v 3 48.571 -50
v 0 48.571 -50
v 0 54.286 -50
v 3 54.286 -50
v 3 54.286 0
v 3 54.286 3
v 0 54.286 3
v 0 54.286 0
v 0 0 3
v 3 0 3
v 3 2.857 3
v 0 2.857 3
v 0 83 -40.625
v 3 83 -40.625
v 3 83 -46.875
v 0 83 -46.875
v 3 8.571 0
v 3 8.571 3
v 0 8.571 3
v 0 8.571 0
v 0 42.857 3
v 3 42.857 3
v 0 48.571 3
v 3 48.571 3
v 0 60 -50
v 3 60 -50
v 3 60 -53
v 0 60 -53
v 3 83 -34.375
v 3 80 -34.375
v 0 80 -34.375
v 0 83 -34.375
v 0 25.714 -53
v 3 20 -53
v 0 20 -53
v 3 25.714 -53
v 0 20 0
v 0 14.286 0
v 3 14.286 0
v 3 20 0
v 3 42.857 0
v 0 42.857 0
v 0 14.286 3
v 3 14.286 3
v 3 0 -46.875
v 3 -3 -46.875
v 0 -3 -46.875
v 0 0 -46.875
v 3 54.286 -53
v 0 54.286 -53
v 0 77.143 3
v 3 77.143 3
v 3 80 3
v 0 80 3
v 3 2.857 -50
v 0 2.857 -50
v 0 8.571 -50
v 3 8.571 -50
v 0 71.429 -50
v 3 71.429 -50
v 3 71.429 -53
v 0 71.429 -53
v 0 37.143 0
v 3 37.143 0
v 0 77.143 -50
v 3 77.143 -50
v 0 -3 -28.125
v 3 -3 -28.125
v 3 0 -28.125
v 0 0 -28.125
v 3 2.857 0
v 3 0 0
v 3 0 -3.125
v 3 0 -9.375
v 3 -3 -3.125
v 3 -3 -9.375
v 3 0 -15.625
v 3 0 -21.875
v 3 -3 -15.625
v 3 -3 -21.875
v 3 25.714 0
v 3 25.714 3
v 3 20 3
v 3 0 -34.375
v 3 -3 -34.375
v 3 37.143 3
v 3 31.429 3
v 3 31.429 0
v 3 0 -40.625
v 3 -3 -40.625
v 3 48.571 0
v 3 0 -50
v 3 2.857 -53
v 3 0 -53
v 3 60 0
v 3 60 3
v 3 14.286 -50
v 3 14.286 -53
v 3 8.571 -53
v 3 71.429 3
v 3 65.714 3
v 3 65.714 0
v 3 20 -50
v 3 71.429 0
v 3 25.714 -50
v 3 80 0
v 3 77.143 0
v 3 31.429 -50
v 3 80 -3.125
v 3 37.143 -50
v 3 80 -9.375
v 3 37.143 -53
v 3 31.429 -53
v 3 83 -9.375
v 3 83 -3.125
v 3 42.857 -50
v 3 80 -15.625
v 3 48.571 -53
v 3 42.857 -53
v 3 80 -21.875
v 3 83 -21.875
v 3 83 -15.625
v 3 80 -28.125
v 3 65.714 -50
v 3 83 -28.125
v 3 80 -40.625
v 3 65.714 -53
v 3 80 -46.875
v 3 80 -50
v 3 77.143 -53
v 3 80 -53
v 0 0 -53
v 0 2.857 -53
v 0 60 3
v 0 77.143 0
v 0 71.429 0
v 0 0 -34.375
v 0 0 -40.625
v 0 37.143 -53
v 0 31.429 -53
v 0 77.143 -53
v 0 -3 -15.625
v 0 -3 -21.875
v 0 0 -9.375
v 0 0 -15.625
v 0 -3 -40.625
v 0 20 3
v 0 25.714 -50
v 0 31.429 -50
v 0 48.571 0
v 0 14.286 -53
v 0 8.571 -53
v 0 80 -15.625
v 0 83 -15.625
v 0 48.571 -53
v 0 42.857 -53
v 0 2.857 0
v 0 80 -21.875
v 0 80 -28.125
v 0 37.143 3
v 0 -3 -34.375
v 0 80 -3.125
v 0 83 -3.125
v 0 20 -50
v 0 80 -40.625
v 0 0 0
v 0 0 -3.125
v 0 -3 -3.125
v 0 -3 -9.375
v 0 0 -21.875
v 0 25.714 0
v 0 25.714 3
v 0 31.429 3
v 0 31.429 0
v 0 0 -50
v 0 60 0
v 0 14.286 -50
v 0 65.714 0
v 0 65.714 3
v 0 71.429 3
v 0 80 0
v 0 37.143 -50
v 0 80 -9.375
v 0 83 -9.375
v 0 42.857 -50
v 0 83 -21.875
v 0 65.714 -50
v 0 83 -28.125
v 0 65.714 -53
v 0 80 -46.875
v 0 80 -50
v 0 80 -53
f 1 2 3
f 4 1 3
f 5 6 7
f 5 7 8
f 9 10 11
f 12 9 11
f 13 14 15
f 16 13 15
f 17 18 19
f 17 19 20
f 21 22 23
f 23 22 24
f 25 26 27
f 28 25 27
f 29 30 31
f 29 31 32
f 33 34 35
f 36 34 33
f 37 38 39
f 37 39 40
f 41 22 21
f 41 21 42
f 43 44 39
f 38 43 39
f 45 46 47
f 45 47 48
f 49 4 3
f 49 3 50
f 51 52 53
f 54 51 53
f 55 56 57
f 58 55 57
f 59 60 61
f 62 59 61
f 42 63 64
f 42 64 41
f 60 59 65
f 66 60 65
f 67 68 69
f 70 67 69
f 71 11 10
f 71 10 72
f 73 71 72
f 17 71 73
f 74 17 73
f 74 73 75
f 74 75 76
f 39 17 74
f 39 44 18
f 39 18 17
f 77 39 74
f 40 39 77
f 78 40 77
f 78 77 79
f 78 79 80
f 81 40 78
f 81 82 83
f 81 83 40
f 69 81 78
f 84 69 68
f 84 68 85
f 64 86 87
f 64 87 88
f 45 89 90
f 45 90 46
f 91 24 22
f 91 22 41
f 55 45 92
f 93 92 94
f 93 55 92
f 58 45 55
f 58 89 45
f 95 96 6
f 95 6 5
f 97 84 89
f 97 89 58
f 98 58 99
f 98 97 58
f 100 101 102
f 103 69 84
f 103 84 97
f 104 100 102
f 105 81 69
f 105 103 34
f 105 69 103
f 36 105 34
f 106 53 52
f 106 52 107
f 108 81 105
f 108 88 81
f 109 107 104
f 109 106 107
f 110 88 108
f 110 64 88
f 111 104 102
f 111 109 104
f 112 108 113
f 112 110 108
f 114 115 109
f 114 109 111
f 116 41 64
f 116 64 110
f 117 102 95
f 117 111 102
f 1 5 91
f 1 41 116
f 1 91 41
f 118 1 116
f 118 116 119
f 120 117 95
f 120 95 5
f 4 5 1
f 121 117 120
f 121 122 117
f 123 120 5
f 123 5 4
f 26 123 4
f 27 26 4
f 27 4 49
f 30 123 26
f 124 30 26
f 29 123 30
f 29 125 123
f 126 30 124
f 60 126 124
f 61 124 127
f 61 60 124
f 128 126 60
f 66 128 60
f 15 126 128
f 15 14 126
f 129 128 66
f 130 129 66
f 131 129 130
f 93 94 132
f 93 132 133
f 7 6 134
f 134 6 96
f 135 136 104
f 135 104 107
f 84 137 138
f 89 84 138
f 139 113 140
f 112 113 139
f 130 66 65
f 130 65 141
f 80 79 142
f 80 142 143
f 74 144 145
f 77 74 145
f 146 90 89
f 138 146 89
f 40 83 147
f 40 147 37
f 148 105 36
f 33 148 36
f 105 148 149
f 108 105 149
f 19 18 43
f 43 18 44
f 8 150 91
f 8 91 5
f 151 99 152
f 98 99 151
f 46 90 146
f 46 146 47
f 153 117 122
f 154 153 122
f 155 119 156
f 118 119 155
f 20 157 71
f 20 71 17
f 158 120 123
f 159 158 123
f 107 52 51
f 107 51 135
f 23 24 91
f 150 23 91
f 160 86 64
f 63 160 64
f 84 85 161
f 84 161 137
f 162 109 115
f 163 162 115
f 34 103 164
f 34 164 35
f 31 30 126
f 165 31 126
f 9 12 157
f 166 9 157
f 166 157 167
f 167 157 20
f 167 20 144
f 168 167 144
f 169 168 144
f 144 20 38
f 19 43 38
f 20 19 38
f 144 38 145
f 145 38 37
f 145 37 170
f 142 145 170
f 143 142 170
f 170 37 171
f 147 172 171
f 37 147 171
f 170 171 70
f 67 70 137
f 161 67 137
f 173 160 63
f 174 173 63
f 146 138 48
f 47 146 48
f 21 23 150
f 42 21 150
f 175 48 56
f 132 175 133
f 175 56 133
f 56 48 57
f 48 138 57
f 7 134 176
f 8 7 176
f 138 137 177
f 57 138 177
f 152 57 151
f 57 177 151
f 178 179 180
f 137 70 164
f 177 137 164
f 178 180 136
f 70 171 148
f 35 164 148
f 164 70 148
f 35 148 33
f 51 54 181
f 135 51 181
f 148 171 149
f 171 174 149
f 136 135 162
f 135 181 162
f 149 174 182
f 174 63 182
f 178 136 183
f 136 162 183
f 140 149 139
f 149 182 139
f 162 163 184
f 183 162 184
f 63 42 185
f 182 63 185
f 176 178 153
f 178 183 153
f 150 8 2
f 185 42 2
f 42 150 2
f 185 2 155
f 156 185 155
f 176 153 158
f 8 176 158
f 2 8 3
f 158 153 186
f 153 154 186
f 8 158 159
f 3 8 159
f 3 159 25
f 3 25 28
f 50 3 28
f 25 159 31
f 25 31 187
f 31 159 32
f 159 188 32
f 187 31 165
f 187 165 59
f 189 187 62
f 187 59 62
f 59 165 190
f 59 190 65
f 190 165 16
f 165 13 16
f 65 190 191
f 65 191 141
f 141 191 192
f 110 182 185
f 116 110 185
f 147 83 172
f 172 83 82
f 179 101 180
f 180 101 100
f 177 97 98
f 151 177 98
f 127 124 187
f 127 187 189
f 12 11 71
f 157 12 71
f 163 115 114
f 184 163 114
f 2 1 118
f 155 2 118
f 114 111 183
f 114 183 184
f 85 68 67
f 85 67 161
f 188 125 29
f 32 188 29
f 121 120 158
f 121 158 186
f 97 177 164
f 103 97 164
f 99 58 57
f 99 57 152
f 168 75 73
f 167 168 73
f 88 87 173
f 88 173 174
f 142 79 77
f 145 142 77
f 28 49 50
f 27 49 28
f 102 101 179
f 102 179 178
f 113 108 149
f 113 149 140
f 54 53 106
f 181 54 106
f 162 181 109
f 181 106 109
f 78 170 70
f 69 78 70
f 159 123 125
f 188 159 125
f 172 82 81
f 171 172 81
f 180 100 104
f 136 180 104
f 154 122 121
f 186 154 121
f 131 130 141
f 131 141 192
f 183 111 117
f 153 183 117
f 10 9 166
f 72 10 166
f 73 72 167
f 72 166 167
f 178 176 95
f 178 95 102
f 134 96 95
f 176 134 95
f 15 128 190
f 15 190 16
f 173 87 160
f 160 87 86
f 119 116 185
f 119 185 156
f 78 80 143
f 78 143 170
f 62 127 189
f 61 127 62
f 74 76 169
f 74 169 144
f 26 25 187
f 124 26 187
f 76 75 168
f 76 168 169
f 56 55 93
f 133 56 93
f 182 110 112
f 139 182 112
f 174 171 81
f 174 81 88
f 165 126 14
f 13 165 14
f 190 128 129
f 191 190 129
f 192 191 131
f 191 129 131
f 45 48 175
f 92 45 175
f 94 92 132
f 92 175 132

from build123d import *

# Parameters (mm, degrees)
SCHIZZO1_W                   = 50
SCHIZZO1_H                   = 80
ESTRUSIONE_ESTRUSIONE1_DEPTH = 3
SCHIZZO2_W                   = 3
SCHIZZO2_H                   = 2.857142857
ESTRUSIONE_ESTRUSIONE2_DEPTH = 3
SCHIZZO3_W                   = 3
SCHIZZO3_H                   = 5.714285715
ESTRUSIONE_ESTRUSIONE3_DEPTH = 3
RIPETIZIONE_A_L1_COUNT       = 6
RIPETIZIONE_A_L1_PITCH       = 11.428571
SCHIZZO4_W                   = 6.25
SCHIZZO4_H                   = 3
ESTRUSIONE_ESTRUSIONE4_DEPTH = 3
RIPETIZIONE_A_L2_COUNT       = 4
RIPETIZIONE_A_L2_PITCH       = 12.5


with BuildPart() as part:
    # Schizzo1 → Estrusione-Estrusione1 (new body)
    with BuildSketch(Plane(origin=(0, 0, 0), x_dir=(0, 0, -1), z_dir=(1, 0, 0))):
        with Locations((25, 40)):
            Rectangle(SCHIZZO1_W, SCHIZZO1_H)
    extrude(amount=ESTRUSIONE_ESTRUSIONE1_DEPTH)

    # Schizzo2 → Estrusione-Estrusione2 (add)
    with BuildSketch(Plane(origin=(3, 0, 0), x_dir=(0, 0, -1), z_dir=(1, 0, 0))):
        with Locations((-1.5, 78.571428572)):
            Rectangle(SCHIZZO2_W, SCHIZZO2_H)
        with Locations((51.5, 78.571428572)):
            Rectangle(SCHIZZO2_W, SCHIZZO2_H)
        with Locations((51.5, 1.428571429)):
            Rectangle(SCHIZZO2_W, SCHIZZO2_H)
        with Locations((-1.5, 1.428571429)):
            Rectangle(SCHIZZO2_W, SCHIZZO2_H)
    extrude(amount=-ESTRUSIONE_ESTRUSIONE2_DEPTH)

    # Schizzo3 → Estrusione-Estrusione3 (add)
    with BuildSketch(Plane(origin=(3, 0, 0), x_dir=(0, 0, -1), z_dir=(1, 0, 0))):
        with Locations((-1.5, 68.571428572)):
            Rectangle(SCHIZZO3_W, SCHIZZO3_H)
        with Locations((51.5, 68.571428572)):
            Rectangle(SCHIZZO3_W, SCHIZZO3_H)
    estrusione_estrusione3 = extrude(amount=-ESTRUSIONE_ESTRUSIONE3_DEPTH)

    # Ripetizione a L1: Estrusione-Estrusione3 ×6
    with Locations(*[(0, -i * RIPETIZIONE_A_L1_PITCH, 0) for i in range(1, RIPETIZIONE_A_L1_COUNT)]):
        add(estrusione_estrusione3)

    # Schizzo4 → Estrusione-Estrusione4 (add)
    with BuildSketch(Plane(origin=(3, 0, 0), x_dir=(0, 0, -1), z_dir=(1, 0, 0))):
        with Locations((6.25, 81.5)):
            Rectangle(SCHIZZO4_W, SCHIZZO4_H)
        with Locations((6.25, -1.5)):
            Rectangle(SCHIZZO4_W, SCHIZZO4_H)
    estrusione_estrusione4 = extrude(amount=-ESTRUSIONE_ESTRUSIONE4_DEPTH)

    # Ripetizione a L2: Estrusione-Estrusione4 ×4
    with Locations(*[(0, 0, -i * RIPETIZIONE_A_L2_PITCH) for i in range(1, RIPETIZIONE_A_L2_COUNT)]):
        add(estrusione_estrusione4)


solid = part.part
